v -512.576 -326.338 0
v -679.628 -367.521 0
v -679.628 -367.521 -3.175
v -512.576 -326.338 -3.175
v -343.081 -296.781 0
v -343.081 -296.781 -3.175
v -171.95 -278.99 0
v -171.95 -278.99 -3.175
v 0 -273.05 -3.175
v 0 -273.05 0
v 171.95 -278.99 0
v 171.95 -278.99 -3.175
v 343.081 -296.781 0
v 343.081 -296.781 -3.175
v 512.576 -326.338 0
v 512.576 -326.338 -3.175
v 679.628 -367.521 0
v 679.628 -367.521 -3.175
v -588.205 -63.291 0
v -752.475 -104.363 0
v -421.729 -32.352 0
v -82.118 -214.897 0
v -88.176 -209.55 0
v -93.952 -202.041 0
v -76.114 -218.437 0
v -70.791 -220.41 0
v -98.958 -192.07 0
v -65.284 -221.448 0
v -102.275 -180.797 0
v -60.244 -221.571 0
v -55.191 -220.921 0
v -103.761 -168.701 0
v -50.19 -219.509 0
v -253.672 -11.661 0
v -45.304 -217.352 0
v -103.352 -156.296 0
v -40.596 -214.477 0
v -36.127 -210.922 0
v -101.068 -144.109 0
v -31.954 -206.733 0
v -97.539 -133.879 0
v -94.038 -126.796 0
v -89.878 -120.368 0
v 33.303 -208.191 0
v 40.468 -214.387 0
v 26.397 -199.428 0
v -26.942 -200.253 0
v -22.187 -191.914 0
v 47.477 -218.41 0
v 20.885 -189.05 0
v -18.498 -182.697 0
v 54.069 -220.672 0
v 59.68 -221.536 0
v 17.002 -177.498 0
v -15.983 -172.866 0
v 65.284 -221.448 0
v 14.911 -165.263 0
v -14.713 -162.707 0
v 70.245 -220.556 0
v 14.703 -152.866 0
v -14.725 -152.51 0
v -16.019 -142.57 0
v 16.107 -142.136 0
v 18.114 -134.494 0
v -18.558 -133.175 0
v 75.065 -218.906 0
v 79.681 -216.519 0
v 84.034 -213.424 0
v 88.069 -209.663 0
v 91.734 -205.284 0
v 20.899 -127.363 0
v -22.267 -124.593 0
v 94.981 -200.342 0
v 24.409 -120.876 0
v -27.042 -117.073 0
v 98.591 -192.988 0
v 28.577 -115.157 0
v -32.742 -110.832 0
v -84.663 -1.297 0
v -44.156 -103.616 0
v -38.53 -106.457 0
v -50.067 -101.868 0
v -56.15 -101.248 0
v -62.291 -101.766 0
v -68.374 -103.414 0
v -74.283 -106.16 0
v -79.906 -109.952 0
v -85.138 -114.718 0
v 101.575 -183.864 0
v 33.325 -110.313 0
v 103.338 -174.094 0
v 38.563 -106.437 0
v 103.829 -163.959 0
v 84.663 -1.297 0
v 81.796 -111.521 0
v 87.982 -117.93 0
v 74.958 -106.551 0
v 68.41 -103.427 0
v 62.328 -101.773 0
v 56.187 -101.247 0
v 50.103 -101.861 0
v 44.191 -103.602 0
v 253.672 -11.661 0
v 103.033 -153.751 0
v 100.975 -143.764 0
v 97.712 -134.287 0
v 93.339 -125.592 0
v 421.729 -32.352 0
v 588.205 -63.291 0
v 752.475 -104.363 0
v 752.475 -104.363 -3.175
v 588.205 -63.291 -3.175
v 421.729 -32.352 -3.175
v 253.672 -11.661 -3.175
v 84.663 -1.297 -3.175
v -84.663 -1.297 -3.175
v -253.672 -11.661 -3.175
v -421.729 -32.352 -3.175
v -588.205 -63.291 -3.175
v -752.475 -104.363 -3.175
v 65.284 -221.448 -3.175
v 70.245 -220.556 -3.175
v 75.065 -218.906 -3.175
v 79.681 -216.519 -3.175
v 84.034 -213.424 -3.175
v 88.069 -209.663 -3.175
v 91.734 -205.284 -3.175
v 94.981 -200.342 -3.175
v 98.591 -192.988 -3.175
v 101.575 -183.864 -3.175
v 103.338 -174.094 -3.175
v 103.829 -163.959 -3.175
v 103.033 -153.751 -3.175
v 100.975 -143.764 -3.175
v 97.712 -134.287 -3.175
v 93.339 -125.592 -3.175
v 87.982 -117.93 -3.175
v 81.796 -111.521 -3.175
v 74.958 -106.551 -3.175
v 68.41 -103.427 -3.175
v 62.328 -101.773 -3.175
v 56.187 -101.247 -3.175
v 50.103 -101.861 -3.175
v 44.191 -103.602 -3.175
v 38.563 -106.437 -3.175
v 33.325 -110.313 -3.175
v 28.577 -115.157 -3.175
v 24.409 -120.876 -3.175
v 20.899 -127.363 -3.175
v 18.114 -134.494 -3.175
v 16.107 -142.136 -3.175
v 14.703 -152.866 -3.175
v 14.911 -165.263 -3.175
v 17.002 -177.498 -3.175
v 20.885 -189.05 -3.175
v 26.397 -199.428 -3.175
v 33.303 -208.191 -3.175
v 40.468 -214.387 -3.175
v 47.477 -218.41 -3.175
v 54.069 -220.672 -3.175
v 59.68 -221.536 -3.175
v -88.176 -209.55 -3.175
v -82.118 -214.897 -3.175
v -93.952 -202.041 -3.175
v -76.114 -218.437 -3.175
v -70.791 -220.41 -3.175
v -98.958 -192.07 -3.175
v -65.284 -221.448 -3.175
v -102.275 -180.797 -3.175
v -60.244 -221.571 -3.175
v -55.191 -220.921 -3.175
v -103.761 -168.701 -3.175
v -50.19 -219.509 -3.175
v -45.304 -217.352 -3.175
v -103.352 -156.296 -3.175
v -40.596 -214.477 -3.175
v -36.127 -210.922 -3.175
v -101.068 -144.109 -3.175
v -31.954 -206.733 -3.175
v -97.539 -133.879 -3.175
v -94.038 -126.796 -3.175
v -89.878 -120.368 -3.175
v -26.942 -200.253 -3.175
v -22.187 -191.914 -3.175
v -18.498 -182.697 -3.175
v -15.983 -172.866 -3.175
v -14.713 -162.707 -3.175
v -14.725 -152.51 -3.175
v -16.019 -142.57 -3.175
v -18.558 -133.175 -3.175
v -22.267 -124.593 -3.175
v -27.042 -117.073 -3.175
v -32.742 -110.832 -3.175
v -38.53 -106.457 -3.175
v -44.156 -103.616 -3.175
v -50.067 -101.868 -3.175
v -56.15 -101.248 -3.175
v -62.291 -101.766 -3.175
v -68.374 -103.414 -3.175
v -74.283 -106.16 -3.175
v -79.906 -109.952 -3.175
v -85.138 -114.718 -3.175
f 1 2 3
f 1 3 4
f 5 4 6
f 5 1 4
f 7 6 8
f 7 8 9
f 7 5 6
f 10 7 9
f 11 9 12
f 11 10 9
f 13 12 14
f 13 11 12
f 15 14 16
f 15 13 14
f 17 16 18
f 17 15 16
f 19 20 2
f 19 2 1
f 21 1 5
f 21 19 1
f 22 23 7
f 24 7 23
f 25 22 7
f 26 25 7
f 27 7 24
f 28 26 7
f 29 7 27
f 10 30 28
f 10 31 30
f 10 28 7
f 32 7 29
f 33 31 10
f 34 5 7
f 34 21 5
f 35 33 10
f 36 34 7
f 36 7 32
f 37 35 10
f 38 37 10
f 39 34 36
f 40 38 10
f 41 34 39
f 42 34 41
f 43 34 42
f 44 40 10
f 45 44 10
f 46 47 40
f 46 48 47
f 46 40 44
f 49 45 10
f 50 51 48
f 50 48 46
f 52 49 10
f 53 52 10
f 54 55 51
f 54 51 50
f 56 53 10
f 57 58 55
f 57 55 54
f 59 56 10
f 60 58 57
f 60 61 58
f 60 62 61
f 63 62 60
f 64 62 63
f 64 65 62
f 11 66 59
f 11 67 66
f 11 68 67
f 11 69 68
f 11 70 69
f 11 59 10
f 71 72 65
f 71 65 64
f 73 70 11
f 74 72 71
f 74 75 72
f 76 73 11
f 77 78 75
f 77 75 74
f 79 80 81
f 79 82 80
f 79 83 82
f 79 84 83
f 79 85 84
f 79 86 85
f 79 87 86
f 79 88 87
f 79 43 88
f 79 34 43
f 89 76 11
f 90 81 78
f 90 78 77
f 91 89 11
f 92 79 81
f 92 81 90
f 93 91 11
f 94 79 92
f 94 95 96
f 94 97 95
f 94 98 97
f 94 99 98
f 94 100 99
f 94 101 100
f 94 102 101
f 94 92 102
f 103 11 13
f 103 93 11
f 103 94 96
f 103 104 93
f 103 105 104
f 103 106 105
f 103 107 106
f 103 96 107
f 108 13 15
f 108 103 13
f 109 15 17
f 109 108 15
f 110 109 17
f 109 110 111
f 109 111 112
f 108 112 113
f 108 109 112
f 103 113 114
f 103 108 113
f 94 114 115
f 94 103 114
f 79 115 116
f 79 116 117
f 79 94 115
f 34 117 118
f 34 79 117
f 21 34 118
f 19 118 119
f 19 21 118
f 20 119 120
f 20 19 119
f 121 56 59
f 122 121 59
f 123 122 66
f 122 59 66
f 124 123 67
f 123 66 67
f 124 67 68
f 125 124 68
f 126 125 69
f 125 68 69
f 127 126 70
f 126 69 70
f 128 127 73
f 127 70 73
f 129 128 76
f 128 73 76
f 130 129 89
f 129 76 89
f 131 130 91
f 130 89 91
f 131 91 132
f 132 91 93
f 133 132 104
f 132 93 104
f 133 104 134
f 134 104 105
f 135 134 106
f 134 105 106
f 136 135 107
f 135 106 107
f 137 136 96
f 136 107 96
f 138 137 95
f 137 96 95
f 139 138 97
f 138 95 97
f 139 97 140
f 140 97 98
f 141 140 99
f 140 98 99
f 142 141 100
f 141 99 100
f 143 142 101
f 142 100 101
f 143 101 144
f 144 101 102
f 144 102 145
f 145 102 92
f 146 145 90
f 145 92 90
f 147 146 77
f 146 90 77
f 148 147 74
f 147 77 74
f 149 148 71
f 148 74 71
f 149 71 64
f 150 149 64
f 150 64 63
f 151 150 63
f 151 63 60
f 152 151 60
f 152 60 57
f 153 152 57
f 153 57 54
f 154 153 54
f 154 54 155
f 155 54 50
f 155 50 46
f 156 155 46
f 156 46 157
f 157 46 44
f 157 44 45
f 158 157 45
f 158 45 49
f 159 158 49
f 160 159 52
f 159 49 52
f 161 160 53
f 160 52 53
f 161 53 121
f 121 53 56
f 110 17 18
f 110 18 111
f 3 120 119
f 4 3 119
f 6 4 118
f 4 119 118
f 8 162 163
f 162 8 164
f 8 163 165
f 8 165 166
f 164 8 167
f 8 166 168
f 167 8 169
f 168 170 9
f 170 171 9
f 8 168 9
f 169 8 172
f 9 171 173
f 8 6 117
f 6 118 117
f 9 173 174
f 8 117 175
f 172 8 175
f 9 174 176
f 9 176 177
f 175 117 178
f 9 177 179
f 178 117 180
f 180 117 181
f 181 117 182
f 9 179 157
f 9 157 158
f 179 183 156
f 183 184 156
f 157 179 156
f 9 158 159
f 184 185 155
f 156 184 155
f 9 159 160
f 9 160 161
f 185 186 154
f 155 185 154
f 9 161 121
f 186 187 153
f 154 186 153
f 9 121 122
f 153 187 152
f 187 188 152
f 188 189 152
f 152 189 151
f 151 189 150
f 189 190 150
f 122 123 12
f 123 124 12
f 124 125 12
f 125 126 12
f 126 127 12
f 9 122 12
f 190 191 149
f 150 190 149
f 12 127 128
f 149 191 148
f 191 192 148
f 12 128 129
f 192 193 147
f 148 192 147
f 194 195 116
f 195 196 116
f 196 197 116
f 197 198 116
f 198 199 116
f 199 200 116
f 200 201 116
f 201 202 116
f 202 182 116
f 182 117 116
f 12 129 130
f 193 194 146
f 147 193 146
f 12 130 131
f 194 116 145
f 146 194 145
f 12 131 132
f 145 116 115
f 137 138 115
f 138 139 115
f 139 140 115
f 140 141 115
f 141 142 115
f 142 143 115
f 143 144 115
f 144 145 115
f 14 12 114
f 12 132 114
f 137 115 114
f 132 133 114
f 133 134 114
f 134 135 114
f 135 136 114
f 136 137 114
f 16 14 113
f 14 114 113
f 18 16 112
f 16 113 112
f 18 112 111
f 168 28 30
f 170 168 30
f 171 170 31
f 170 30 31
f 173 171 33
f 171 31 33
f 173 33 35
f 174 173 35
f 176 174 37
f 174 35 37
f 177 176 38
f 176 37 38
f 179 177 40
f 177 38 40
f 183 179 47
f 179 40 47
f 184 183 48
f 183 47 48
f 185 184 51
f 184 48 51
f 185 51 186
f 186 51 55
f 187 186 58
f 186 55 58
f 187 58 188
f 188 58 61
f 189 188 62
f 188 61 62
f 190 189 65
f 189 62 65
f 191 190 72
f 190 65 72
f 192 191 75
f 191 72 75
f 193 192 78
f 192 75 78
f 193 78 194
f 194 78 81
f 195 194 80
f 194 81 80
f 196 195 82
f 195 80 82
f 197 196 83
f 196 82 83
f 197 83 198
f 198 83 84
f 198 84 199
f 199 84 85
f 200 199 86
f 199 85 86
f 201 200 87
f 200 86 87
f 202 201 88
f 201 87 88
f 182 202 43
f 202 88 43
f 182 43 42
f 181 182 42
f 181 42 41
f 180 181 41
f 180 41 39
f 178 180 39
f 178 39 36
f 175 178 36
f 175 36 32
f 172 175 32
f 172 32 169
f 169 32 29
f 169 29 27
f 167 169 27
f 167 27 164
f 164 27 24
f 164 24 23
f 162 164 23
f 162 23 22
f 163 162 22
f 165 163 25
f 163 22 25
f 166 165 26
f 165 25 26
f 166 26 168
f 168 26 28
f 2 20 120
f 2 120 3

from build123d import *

# Parameters (mm, degrees)
SKETCH1_RX         = 60.325
SKETCH1_RY         = 44.45
BASE_EXTRUDE_DEPTH = 3.175


with BuildPart() as part:
    # Sketch1 → Base-Extrude (new body)
    with BuildSketch(Plane.XY):
        with BuildLine():
            Line((-752.475, -104.363036769), (-679.6278, -367.521079599))
            ThreePointArc((-679.6278, -367.521079599), (0, -273.05), (679.6278, -367.521079599))
            Line((679.6278, -367.521079599), (752.475, -104.363036769))
            ThreePointArc((752.475, -104.363036769), (0, 0), (-752.475, -104.363036769))
        make_face()
        with Locations(Location((-59.197924106, -161.431165366), (0, 0, -95.79))):
            Ellipse(SKETCH1_RX, SKETCH1_RY, mode=Mode.SUBTRACT)
        with Locations(Location((59.197924106, -161.431165366), (0, 0, -84.21))):
            Ellipse(SKETCH1_RX, SKETCH1_RY, mode=Mode.SUBTRACT)
    extrude(amount=-BASE_EXTRUDE_DEPTH)


solid = part.part
